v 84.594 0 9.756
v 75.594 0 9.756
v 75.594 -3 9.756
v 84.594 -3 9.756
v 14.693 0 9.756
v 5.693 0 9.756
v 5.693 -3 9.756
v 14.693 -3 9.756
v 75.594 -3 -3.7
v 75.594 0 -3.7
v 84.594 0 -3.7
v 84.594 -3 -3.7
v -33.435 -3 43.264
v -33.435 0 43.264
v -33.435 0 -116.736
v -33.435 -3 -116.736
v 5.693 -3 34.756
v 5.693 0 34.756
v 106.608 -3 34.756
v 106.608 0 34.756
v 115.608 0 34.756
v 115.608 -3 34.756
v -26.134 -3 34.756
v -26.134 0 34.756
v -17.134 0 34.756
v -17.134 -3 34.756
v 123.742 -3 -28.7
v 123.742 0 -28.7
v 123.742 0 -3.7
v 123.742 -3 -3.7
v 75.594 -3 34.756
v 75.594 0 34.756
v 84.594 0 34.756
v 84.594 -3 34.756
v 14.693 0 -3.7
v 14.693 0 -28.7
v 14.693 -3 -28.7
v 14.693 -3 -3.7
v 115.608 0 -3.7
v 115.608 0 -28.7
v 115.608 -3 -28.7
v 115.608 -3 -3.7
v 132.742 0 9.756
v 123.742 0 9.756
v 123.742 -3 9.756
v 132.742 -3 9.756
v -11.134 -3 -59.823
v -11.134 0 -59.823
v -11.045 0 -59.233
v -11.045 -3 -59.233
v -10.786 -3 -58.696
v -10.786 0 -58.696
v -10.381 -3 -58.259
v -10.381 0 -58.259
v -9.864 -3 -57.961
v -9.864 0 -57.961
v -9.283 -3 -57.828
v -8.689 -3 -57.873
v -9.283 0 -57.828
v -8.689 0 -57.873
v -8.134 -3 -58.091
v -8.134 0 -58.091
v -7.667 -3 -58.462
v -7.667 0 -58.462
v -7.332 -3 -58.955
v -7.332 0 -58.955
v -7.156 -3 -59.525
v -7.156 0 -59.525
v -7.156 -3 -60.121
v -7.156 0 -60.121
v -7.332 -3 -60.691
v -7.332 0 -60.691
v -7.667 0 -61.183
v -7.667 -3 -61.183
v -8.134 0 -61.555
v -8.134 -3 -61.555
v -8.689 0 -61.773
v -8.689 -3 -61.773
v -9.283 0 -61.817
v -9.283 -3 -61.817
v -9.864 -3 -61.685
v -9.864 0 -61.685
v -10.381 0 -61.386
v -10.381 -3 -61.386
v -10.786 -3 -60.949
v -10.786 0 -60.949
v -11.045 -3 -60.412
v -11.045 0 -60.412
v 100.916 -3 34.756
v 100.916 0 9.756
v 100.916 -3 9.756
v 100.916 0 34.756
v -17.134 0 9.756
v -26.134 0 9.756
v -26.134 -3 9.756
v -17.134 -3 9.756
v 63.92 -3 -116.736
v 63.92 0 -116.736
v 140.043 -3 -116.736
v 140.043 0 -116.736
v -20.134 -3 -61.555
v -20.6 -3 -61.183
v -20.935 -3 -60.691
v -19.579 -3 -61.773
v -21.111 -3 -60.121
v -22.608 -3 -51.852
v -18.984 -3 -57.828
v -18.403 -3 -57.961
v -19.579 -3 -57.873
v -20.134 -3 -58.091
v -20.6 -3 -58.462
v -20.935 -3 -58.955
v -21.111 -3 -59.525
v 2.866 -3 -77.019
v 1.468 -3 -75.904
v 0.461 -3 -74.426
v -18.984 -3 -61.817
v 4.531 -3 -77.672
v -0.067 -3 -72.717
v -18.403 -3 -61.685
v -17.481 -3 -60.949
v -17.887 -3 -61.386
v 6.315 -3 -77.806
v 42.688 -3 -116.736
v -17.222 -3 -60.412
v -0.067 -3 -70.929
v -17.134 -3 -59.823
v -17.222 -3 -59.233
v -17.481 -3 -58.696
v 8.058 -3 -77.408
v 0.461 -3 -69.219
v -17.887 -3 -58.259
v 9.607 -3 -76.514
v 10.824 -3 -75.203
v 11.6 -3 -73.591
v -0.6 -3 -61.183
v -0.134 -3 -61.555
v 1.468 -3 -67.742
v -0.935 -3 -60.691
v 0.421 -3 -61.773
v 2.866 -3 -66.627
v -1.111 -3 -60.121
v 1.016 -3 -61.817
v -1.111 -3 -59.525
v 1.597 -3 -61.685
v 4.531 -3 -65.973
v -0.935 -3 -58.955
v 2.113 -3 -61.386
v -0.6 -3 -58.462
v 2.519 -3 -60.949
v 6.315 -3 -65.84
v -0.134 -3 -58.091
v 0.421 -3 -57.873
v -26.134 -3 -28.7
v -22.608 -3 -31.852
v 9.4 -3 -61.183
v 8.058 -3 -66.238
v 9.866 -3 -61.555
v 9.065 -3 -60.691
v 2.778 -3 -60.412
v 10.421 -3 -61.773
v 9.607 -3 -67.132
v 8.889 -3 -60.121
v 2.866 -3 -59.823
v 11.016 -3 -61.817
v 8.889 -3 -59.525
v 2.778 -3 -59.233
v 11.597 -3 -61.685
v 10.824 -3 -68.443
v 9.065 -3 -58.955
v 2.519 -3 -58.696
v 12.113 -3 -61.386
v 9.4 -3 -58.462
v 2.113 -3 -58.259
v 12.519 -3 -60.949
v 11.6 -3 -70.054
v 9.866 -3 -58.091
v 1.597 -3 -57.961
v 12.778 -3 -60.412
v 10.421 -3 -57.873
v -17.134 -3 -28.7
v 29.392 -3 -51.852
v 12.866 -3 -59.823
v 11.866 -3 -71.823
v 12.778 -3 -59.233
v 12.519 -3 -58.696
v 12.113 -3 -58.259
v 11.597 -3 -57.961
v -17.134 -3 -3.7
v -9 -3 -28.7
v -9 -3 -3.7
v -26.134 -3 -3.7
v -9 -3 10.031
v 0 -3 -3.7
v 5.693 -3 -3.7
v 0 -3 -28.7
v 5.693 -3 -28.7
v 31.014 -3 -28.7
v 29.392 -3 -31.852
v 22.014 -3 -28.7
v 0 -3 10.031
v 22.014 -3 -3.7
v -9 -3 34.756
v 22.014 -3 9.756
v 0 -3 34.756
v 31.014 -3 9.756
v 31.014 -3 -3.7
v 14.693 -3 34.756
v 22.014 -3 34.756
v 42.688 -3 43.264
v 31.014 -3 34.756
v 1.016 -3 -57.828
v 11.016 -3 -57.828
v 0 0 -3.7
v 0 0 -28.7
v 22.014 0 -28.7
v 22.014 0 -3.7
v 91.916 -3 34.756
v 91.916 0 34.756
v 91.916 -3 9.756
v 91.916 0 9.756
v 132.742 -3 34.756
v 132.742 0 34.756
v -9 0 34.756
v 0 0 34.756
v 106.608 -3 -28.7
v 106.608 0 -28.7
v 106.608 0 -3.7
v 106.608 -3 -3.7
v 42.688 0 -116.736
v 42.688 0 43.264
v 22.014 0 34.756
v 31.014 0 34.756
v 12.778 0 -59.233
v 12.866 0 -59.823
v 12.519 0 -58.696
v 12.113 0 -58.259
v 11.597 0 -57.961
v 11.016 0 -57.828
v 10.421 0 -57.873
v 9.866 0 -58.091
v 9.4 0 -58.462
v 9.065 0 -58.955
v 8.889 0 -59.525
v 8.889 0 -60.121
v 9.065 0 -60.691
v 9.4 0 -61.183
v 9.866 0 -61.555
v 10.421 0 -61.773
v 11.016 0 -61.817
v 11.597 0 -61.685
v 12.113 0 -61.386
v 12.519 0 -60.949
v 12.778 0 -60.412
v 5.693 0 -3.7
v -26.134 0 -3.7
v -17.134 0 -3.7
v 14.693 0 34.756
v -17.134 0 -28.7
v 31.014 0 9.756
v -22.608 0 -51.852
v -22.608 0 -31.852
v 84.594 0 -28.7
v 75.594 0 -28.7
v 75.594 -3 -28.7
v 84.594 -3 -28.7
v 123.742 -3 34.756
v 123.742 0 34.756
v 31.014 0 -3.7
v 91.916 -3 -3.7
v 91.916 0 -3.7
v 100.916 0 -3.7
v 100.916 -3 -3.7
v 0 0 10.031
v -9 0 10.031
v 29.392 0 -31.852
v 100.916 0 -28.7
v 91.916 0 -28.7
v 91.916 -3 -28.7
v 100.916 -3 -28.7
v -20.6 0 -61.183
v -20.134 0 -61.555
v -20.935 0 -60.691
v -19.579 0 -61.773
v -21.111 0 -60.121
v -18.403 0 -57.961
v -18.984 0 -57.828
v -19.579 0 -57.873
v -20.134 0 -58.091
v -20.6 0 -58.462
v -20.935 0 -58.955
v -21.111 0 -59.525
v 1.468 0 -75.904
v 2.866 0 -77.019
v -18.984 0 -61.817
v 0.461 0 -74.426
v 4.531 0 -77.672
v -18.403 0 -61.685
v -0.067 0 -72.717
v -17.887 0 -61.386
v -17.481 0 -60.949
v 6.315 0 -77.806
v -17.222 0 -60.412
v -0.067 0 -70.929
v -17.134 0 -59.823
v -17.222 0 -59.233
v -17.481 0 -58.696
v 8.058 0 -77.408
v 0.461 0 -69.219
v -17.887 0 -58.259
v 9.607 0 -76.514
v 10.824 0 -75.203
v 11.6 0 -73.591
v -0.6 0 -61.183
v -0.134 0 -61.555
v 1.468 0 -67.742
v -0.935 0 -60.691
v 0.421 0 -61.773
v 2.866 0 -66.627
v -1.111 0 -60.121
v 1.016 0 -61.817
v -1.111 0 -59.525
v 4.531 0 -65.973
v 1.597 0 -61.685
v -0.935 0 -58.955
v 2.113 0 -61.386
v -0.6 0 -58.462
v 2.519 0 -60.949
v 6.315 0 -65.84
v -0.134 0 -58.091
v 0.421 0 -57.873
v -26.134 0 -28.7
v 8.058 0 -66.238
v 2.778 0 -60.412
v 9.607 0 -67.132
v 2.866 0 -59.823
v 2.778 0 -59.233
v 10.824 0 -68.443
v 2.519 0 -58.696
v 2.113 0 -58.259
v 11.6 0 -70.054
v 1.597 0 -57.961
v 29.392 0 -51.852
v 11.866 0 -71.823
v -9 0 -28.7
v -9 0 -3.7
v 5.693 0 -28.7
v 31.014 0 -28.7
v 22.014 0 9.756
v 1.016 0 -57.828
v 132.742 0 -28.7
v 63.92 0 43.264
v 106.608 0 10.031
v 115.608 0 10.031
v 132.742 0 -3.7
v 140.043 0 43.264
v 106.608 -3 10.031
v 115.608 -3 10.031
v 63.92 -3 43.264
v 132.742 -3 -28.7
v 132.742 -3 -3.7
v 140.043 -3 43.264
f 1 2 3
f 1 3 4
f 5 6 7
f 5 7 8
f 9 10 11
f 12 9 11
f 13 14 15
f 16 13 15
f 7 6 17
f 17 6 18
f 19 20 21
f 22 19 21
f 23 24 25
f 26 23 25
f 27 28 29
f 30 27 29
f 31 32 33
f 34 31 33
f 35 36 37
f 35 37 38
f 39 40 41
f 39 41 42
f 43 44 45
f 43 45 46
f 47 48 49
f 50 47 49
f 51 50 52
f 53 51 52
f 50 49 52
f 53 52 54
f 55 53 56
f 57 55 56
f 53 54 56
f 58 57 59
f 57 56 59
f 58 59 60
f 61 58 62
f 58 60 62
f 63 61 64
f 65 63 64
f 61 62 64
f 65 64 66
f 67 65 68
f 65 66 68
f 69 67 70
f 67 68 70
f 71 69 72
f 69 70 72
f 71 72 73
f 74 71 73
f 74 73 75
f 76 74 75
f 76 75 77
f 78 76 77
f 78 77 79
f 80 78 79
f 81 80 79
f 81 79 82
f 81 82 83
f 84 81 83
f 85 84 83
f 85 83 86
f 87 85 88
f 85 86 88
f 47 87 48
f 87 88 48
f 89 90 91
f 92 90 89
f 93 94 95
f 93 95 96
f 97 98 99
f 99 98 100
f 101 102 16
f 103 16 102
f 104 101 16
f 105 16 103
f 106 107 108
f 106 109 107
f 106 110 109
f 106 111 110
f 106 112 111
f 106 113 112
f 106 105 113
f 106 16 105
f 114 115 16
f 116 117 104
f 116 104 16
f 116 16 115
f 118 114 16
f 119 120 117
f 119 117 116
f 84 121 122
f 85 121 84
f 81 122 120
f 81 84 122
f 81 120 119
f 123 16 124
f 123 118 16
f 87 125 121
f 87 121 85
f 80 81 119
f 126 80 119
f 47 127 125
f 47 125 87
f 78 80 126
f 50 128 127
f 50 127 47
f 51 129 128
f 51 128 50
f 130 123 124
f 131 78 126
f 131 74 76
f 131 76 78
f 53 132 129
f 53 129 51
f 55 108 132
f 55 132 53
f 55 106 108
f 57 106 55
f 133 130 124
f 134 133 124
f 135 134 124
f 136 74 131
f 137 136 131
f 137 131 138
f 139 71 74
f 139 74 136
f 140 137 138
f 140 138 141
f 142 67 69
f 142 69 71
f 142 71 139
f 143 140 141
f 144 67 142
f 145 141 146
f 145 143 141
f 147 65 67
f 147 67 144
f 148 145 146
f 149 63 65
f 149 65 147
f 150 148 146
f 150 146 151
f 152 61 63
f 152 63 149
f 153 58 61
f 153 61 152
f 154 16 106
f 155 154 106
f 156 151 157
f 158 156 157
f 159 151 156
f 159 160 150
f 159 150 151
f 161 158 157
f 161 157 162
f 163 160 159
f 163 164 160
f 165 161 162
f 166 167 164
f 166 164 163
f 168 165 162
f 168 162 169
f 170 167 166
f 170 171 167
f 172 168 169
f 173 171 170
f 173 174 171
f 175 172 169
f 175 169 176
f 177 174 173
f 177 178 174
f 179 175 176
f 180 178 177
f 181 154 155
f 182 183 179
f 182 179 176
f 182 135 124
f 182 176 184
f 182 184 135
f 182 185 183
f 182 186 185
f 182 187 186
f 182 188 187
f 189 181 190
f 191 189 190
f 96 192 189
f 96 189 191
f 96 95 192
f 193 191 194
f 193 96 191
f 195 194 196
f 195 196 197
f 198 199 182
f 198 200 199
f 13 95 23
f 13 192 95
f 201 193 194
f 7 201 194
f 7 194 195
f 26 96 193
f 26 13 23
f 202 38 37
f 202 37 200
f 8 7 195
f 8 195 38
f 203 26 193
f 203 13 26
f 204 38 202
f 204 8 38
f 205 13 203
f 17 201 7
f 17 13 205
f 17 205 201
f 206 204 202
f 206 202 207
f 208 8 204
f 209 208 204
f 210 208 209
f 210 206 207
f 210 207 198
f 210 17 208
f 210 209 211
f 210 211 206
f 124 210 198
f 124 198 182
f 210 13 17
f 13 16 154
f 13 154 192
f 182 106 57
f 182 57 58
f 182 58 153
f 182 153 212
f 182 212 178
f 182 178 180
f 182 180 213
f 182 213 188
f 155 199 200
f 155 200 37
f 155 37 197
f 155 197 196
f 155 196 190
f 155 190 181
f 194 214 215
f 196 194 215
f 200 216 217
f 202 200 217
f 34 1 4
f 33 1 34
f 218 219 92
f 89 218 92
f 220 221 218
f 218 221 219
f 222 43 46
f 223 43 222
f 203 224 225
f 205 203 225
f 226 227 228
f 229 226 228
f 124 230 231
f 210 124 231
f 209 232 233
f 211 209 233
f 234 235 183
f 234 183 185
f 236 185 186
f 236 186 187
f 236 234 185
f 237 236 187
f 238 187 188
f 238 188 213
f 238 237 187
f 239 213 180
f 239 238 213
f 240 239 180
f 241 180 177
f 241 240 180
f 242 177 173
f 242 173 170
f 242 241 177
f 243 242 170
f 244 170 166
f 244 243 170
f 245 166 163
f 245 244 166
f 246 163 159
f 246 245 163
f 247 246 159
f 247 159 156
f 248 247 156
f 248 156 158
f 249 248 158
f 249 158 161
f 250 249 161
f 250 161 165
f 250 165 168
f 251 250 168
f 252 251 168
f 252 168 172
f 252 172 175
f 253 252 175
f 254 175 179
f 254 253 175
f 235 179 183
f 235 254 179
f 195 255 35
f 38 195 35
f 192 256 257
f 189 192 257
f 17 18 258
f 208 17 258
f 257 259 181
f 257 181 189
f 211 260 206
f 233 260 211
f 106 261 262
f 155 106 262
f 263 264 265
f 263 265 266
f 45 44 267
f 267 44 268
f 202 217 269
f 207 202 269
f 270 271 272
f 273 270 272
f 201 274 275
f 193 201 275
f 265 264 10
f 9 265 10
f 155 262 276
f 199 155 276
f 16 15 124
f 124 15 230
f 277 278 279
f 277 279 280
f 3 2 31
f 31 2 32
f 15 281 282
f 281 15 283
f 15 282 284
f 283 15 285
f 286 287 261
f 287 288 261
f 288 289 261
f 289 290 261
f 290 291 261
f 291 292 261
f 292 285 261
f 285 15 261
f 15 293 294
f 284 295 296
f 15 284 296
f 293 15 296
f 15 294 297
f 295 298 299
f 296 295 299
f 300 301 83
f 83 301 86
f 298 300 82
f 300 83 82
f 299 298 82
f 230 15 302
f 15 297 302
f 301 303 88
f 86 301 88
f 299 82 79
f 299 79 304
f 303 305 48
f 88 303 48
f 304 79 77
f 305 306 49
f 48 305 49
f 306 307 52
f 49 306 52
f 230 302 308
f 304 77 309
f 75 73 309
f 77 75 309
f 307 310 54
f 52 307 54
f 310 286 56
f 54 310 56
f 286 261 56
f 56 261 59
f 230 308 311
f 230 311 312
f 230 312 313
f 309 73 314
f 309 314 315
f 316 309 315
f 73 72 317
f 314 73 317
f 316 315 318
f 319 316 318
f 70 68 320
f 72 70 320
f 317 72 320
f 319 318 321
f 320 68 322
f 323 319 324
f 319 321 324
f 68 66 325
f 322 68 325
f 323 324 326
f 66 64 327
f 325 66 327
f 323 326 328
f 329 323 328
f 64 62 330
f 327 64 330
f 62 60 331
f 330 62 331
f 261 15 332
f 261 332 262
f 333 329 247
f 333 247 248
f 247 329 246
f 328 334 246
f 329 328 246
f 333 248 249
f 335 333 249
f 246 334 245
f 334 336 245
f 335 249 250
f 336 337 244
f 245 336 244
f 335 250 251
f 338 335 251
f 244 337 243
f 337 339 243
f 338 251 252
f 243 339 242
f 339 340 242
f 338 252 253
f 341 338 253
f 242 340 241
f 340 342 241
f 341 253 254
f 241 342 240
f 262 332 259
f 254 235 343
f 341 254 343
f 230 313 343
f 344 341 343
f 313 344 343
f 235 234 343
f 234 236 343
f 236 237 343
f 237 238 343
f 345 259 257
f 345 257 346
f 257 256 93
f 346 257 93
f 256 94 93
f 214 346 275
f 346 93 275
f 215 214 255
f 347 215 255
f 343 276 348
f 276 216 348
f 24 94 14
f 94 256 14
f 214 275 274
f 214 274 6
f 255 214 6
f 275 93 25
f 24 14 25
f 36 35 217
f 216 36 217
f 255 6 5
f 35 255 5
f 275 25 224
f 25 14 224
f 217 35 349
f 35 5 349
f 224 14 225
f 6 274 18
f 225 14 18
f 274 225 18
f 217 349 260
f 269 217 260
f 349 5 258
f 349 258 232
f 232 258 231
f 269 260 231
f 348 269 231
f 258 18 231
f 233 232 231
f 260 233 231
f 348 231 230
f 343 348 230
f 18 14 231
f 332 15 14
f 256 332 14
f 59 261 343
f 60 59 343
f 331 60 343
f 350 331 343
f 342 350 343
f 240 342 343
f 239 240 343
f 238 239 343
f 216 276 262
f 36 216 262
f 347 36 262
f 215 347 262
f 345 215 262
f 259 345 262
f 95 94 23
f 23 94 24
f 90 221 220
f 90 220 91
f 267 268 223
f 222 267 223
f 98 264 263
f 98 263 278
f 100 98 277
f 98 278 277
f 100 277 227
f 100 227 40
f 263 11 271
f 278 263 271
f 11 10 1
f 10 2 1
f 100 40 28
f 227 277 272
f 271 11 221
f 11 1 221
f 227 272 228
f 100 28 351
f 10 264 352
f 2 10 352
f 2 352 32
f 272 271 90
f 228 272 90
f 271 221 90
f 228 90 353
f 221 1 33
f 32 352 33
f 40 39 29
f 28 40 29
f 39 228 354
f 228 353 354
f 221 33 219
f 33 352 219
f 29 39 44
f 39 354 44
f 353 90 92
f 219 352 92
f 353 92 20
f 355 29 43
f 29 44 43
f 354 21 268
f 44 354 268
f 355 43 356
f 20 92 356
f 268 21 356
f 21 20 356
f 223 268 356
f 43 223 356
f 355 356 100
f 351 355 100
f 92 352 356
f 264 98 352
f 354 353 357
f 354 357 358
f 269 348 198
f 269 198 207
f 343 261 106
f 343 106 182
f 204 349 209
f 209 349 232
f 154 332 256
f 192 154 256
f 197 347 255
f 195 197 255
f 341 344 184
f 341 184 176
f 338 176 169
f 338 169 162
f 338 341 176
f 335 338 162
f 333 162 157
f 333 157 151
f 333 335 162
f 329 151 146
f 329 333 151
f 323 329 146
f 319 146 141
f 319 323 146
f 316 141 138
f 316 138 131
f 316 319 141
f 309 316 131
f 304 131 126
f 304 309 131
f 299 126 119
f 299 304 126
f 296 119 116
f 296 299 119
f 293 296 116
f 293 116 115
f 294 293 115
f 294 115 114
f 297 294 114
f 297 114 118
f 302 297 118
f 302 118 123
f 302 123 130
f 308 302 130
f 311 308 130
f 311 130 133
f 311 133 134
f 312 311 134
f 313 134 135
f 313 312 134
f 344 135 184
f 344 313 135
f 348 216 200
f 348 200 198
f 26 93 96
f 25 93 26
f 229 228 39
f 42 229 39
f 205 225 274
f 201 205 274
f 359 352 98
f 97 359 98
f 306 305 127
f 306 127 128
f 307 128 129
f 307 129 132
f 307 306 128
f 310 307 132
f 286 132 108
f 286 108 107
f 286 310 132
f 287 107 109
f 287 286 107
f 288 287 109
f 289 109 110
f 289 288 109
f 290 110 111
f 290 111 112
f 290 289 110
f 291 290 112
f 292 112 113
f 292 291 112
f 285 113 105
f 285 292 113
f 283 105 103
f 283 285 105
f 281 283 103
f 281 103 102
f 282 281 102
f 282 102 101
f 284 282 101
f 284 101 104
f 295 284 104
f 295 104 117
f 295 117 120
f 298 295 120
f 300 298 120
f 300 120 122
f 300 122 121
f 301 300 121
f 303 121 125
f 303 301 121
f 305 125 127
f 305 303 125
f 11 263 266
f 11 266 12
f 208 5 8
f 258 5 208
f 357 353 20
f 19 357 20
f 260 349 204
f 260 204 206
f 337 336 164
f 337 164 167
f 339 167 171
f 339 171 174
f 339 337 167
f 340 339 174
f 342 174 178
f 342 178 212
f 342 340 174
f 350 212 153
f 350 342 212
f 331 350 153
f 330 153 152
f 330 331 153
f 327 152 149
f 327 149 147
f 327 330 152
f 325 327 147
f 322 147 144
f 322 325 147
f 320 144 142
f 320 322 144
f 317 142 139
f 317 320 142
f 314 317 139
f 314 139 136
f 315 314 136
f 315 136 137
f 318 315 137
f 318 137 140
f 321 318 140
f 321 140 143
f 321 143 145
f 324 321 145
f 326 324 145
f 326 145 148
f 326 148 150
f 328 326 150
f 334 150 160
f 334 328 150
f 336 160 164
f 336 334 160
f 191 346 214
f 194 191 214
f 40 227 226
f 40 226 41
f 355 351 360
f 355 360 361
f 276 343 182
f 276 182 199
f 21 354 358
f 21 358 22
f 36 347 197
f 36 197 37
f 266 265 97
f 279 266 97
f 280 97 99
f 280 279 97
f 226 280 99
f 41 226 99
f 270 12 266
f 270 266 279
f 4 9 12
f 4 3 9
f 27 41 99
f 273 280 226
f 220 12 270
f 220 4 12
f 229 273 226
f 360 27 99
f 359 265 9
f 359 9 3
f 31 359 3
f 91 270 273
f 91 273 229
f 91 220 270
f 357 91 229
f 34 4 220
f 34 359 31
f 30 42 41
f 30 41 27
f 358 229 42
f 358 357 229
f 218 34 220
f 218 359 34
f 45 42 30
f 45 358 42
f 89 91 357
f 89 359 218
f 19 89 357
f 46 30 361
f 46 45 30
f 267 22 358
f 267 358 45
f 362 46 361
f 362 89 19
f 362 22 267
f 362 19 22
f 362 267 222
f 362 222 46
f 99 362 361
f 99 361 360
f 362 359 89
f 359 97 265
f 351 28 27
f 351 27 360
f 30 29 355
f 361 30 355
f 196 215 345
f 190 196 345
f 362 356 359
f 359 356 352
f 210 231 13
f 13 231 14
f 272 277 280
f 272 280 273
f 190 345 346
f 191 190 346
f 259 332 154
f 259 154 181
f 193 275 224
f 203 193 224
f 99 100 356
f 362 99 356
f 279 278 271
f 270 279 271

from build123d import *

# Parameters (mm, degrees)
F0_R     = 2
F0_R_2   = 6
F0_W     = 52
F0_H     = 20
F0_W_2   = 9
F0_H_2   = 25
F1_DEPTH = 3
F0_H_3   = 24.7242773399


with BuildPart() as f1:
    # F0 (on Front) → F1 (new body)
    with BuildSketch(Plane.XZ):
        with BuildLine():
            Line((-33.4349535406, -90.1943072677), (-33.4349535406, -116.7359932065))
            Line((-33.4349535406, -116.7359932065), (-20.3615333885, -116.7359932065))
            Line((-20.3615333885, -116.7359932065), (-20.3615333885, -88.7359932065))
            Line((-20.3615333885, -88.7359932065), (-15.253016612, -74.6326937222))
            ThreePointArc((-15.253016612, -74.6326937222), (-12.8761914321, -69.3241187044), (-10.7033118009, -74.7193815121))
            Line((-10.7033118009, -74.7193815121), (-5.3615333885, -88.7359932065))
            Line((-5.3615333885, -88.7359932065), (-5.3615333885, -116.7359932065))
            Line((-5.3615333885, -116.7359932065), (12.8664459437, -116.7359932065))
            Line((12.8664459437, -116.7359932065), (12.8664459437, -89.0134006739))
            Line((12.8664459437, -89.0134006739), (16.9397874707, -74.5770614979))
            ThreePointArc((16.9397874707, -74.5770614979), (19.4727024752, -69.5690042791), (22.1009911369, -74.5276728743))
            Line((22.1009911369, -74.5276728743), (27.8664459437, -89.0134006739))
            Line((27.8664459437, -89.0134006739), (27.8664459437, -116.7359932065))
            Line((27.8664459437, -116.7359932065), (42.6884633303, -116.7359932065))
            Line((42.6884633303, -116.7359932065), (42.6884633303, 43.2640067935))
            Line((42.6884633303, 43.2640067935), (-33.4349535406, 43.2640067935))
            Line((-33.4349535406, 43.2640067935), (-33.4349535406, 34.7555621043))
            Line((-33.4349535406, 34.7555621043), (-33.4349535406, -90.1943072677))
        make_face()
        with Locations((-19.1335540563, -59.8227716982)):
            Circle(F0_R, mode=Mode.SUBTRACT)
        with Locations((5.8664459437, -71.8227716982)):
            Circle(F0_R_2, mode=Mode.SUBTRACT)
        with BuildLine():
            ThreePointArc((-7.1335540563, -59.8227716982), (-9.1335540563, -61.8227716982), (-11.1335540563, -59.8227716982))
            ThreePointArc((-11.1335540563, -59.8227716982), (-9.1335540563, -57.8227716982), (-7.1335540563, -59.8227716982))
        make_face(mode=Mode.SUBTRACT)
        with Locations((0.8664459437, -59.8227716982)):
            Circle(F0_R, mode=Mode.SUBTRACT)
        with Locations((3.3922115564, -41.8520871103)):
            Rectangle(F0_W, F0_H, mode=Mode.SUBTRACT)
        with Locations((10.8664459437, -59.8227716982)):
            Circle(F0_R, mode=Mode.SUBTRACT)
        with Locations((-21.6335540563, -16.1997724324)):
            Rectangle(F0_W_2, F0_H_2, mode=Mode.SUBTRACT)
        Polygon((-9, -3.6997724324), (0, -3.6997724324), (0, -12.1065765657), (0, -28.6997724324), (-9, -28.6997724324), align=None, mode=Mode.SUBTRACT)
        with Locations((10.1928726844, -16.1997724324)):
            Rectangle(F0_W_2, F0_H_2, mode=Mode.SUBTRACT)
        with Locations((26.5141168684, -16.1997724324)):
            Rectangle(F0_W_2, F0_H_2, mode=Mode.SUBTRACT)
        with Locations((-21.6335540563, 22.2555621043)):
            Rectangle(F0_W_2, F0_H_2, mode=Mode.SUBTRACT)
        Polygon((-9, 10.0312847644), (-9, 34.7555621043), (0, 34.7555621043), (0, 22.3934234343), (0, 10.0312847644), align=None, mode=Mode.SUBTRACT)
        with Locations((10.1928726844, 22.2555621043)):
            Rectangle(F0_W_2, F0_H_2, mode=Mode.SUBTRACT)
        with Locations((26.5141168684, 22.2555621043)):
            Rectangle(F0_W_2, F0_H_2, mode=Mode.SUBTRACT)
        with BuildLine():
            Line((-20.3615333885, -88.7359932065), (-20.3615333885, -116.7359932065))
            Line((-20.3615333885, -116.7359932065), (-5.3615333885, -116.7359932065))
            Line((-5.3615333885, -116.7359932065), (-5.3615333885, -88.7359932065))
            Line((-5.3615333885, -88.7359932065), (-10.7033118009, -74.7193815121))
            ThreePointArc((-10.7033118009, -74.7193815121), (-12.8761914321, -69.3241187044), (-15.253016612, -74.6326937222))
            Line((-15.253016612, -74.6326937222), (-20.3615333885, -88.7359932065))
        make_face()
        with BuildLine():
            Line((12.8664459437, -89.0134006739), (12.8664459437, -116.7359932065))
            Line((12.8664459437, -116.7359932065), (26.4155082405, -116.7359932065))
            Line((26.4155082405, -116.7359932065), (27.8664459437, -116.7359932065))
            Line((27.8664459437, -116.7359932065), (27.8664459437, -89.0134006739))
            Line((27.8664459437, -89.0134006739), (22.1009911369, -74.5276728743))
            ThreePointArc((22.1009911369, -74.5276728743), (19.4727024752, -69.5690042791), (16.9397874707, -74.5770614979))
            Line((16.9397874707, -74.5770614979), (12.8664459437, -89.0134006739))
        make_face()
    extrude(amount=F1_DEPTH)


with BuildPart() as f1b:
    # F0 (on Front) → F1, piece 2 (new body)
    with BuildSketch(Plane.XZ):
        with BuildLine():
            Line((78.7419597656, -89.0134006739), (84.5074145724, -74.5276728743))
            ThreePointArc((84.5074145724, -74.5276728743), (87.1357032341, -69.5690042791), (89.6686182386, -74.5770614979))
            Line((89.6686182386, -74.5770614979), (93.7419597656, -89.0134006739))
            Line((93.7419597656, -89.0134006739), (93.7419597656, -116.7359932065))
            Line((93.7419597656, -116.7359932065), (111.9699390978, -116.7359932065))
            Line((111.9699390978, -116.7359932065), (111.9699390978, -88.7359932065))
            Line((111.9699390978, -88.7359932065), (117.3117175102, -74.7193815121))
            ThreePointArc((117.3117175102, -74.7193815121), (119.4845971414, -69.3241187044), (121.8614223213, -74.6326937222))
            Line((121.8614223213, -74.6326937222), (126.9699390978, -88.7359932065))
            Line((126.9699390978, -88.7359932065), (126.9699390978, -116.7359932065))
            Line((126.9699390978, -116.7359932065), (140.0433592498, -116.7359932065))
            Line((140.0433592498, -116.7359932065), (140.0433592498, -90.1943072677))
            Line((140.0433592498, -90.1943072677), (140.0433592498, 34.7555621043))
            Line((140.0433592498, 34.7555621043), (140.0433592498, 43.2640067935))
            Line((140.0433592498, 43.2640067935), (63.919942379, 43.2640067935))
            Line((63.919942379, 43.2640067935), (63.919942379, -116.7359932065))
            Line((63.919942379, -116.7359932065), (78.7419597656, -116.7359932065))
            Line((78.7419597656, -116.7359932065), (78.7419597656, -89.0134006739))
        make_face()
        with Locations((80.0942888409, -16.1997724324)):
            Rectangle(F0_W_2, F0_H_2, mode=Mode.SUBTRACT)
        with Locations((96.4155330248, -16.1997724324)):
            Rectangle(F0_W_2, F0_H_2, mode=Mode.SUBTRACT)
        with Locations((111.1084057093, -16.1997724324)):
            Rectangle(F0_W_2, F0_H_2, mode=Mode.SUBTRACT)
        with Locations((128.2419597656, -16.1997724324)):
            Rectangle(F0_W_2, F0_H_2, mode=Mode.SUBTRACT)
        with Locations((80.0942888409, 22.2555621043)):
            Rectangle(F0_W_2, F0_H_2, mode=Mode.SUBTRACT)
        with Locations((96.4155330248, 22.2555621043)):
            Rectangle(F0_W_2, F0_H_2, mode=Mode.SUBTRACT)
        with Locations((111.1084057093, 22.3934234343)):
            Rectangle(F0_W_2, F0_H_3, mode=Mode.SUBTRACT)
        with Locations((128.2419597656, 22.2555621043)):
            Rectangle(F0_W_2, F0_H_2, mode=Mode.SUBTRACT)
        with BuildLine():
            ThreePointArc((89.6686182386, -74.5770614979), (87.1357032341, -69.5690042791), (84.5074145724, -74.5276728743))
            Line((84.5074145724, -74.5276728743), (78.7419597656, -89.0134006739))
            Line((78.7419597656, -89.0134006739), (78.7419597656, -116.7359932065))
            Line((78.7419597656, -116.7359932065), (80.1928974688, -116.7359932065))
            Line((80.1928974688, -116.7359932065), (93.7419597656, -116.7359932065))
            Line((93.7419597656, -116.7359932065), (93.7419597656, -89.0134006739))
            Line((93.7419597656, -89.0134006739), (89.6686182386, -74.5770614979))
        make_face()
        with BuildLine():
            Line((111.9699390978, -88.7359932065), (111.9699390978, -116.7359932065))
            Line((111.9699390978, -116.7359932065), (126.9699390978, -116.7359932065))
            Line((126.9699390978, -116.7359932065), (126.9699390978, -88.7359932065))
            Line((126.9699390978, -88.7359932065), (121.8614223213, -74.6326937222))
            ThreePointArc((121.8614223213, -74.6326937222), (119.4845971414, -69.3241187044), (117.3117175102, -74.7193815121))
            Line((117.3117175102, -74.7193815121), (111.9699390978, -88.7359932065))
        make_face()
    extrude(amount=F1_DEPTH)


solid = Compound([f1.part, f1b.part])
